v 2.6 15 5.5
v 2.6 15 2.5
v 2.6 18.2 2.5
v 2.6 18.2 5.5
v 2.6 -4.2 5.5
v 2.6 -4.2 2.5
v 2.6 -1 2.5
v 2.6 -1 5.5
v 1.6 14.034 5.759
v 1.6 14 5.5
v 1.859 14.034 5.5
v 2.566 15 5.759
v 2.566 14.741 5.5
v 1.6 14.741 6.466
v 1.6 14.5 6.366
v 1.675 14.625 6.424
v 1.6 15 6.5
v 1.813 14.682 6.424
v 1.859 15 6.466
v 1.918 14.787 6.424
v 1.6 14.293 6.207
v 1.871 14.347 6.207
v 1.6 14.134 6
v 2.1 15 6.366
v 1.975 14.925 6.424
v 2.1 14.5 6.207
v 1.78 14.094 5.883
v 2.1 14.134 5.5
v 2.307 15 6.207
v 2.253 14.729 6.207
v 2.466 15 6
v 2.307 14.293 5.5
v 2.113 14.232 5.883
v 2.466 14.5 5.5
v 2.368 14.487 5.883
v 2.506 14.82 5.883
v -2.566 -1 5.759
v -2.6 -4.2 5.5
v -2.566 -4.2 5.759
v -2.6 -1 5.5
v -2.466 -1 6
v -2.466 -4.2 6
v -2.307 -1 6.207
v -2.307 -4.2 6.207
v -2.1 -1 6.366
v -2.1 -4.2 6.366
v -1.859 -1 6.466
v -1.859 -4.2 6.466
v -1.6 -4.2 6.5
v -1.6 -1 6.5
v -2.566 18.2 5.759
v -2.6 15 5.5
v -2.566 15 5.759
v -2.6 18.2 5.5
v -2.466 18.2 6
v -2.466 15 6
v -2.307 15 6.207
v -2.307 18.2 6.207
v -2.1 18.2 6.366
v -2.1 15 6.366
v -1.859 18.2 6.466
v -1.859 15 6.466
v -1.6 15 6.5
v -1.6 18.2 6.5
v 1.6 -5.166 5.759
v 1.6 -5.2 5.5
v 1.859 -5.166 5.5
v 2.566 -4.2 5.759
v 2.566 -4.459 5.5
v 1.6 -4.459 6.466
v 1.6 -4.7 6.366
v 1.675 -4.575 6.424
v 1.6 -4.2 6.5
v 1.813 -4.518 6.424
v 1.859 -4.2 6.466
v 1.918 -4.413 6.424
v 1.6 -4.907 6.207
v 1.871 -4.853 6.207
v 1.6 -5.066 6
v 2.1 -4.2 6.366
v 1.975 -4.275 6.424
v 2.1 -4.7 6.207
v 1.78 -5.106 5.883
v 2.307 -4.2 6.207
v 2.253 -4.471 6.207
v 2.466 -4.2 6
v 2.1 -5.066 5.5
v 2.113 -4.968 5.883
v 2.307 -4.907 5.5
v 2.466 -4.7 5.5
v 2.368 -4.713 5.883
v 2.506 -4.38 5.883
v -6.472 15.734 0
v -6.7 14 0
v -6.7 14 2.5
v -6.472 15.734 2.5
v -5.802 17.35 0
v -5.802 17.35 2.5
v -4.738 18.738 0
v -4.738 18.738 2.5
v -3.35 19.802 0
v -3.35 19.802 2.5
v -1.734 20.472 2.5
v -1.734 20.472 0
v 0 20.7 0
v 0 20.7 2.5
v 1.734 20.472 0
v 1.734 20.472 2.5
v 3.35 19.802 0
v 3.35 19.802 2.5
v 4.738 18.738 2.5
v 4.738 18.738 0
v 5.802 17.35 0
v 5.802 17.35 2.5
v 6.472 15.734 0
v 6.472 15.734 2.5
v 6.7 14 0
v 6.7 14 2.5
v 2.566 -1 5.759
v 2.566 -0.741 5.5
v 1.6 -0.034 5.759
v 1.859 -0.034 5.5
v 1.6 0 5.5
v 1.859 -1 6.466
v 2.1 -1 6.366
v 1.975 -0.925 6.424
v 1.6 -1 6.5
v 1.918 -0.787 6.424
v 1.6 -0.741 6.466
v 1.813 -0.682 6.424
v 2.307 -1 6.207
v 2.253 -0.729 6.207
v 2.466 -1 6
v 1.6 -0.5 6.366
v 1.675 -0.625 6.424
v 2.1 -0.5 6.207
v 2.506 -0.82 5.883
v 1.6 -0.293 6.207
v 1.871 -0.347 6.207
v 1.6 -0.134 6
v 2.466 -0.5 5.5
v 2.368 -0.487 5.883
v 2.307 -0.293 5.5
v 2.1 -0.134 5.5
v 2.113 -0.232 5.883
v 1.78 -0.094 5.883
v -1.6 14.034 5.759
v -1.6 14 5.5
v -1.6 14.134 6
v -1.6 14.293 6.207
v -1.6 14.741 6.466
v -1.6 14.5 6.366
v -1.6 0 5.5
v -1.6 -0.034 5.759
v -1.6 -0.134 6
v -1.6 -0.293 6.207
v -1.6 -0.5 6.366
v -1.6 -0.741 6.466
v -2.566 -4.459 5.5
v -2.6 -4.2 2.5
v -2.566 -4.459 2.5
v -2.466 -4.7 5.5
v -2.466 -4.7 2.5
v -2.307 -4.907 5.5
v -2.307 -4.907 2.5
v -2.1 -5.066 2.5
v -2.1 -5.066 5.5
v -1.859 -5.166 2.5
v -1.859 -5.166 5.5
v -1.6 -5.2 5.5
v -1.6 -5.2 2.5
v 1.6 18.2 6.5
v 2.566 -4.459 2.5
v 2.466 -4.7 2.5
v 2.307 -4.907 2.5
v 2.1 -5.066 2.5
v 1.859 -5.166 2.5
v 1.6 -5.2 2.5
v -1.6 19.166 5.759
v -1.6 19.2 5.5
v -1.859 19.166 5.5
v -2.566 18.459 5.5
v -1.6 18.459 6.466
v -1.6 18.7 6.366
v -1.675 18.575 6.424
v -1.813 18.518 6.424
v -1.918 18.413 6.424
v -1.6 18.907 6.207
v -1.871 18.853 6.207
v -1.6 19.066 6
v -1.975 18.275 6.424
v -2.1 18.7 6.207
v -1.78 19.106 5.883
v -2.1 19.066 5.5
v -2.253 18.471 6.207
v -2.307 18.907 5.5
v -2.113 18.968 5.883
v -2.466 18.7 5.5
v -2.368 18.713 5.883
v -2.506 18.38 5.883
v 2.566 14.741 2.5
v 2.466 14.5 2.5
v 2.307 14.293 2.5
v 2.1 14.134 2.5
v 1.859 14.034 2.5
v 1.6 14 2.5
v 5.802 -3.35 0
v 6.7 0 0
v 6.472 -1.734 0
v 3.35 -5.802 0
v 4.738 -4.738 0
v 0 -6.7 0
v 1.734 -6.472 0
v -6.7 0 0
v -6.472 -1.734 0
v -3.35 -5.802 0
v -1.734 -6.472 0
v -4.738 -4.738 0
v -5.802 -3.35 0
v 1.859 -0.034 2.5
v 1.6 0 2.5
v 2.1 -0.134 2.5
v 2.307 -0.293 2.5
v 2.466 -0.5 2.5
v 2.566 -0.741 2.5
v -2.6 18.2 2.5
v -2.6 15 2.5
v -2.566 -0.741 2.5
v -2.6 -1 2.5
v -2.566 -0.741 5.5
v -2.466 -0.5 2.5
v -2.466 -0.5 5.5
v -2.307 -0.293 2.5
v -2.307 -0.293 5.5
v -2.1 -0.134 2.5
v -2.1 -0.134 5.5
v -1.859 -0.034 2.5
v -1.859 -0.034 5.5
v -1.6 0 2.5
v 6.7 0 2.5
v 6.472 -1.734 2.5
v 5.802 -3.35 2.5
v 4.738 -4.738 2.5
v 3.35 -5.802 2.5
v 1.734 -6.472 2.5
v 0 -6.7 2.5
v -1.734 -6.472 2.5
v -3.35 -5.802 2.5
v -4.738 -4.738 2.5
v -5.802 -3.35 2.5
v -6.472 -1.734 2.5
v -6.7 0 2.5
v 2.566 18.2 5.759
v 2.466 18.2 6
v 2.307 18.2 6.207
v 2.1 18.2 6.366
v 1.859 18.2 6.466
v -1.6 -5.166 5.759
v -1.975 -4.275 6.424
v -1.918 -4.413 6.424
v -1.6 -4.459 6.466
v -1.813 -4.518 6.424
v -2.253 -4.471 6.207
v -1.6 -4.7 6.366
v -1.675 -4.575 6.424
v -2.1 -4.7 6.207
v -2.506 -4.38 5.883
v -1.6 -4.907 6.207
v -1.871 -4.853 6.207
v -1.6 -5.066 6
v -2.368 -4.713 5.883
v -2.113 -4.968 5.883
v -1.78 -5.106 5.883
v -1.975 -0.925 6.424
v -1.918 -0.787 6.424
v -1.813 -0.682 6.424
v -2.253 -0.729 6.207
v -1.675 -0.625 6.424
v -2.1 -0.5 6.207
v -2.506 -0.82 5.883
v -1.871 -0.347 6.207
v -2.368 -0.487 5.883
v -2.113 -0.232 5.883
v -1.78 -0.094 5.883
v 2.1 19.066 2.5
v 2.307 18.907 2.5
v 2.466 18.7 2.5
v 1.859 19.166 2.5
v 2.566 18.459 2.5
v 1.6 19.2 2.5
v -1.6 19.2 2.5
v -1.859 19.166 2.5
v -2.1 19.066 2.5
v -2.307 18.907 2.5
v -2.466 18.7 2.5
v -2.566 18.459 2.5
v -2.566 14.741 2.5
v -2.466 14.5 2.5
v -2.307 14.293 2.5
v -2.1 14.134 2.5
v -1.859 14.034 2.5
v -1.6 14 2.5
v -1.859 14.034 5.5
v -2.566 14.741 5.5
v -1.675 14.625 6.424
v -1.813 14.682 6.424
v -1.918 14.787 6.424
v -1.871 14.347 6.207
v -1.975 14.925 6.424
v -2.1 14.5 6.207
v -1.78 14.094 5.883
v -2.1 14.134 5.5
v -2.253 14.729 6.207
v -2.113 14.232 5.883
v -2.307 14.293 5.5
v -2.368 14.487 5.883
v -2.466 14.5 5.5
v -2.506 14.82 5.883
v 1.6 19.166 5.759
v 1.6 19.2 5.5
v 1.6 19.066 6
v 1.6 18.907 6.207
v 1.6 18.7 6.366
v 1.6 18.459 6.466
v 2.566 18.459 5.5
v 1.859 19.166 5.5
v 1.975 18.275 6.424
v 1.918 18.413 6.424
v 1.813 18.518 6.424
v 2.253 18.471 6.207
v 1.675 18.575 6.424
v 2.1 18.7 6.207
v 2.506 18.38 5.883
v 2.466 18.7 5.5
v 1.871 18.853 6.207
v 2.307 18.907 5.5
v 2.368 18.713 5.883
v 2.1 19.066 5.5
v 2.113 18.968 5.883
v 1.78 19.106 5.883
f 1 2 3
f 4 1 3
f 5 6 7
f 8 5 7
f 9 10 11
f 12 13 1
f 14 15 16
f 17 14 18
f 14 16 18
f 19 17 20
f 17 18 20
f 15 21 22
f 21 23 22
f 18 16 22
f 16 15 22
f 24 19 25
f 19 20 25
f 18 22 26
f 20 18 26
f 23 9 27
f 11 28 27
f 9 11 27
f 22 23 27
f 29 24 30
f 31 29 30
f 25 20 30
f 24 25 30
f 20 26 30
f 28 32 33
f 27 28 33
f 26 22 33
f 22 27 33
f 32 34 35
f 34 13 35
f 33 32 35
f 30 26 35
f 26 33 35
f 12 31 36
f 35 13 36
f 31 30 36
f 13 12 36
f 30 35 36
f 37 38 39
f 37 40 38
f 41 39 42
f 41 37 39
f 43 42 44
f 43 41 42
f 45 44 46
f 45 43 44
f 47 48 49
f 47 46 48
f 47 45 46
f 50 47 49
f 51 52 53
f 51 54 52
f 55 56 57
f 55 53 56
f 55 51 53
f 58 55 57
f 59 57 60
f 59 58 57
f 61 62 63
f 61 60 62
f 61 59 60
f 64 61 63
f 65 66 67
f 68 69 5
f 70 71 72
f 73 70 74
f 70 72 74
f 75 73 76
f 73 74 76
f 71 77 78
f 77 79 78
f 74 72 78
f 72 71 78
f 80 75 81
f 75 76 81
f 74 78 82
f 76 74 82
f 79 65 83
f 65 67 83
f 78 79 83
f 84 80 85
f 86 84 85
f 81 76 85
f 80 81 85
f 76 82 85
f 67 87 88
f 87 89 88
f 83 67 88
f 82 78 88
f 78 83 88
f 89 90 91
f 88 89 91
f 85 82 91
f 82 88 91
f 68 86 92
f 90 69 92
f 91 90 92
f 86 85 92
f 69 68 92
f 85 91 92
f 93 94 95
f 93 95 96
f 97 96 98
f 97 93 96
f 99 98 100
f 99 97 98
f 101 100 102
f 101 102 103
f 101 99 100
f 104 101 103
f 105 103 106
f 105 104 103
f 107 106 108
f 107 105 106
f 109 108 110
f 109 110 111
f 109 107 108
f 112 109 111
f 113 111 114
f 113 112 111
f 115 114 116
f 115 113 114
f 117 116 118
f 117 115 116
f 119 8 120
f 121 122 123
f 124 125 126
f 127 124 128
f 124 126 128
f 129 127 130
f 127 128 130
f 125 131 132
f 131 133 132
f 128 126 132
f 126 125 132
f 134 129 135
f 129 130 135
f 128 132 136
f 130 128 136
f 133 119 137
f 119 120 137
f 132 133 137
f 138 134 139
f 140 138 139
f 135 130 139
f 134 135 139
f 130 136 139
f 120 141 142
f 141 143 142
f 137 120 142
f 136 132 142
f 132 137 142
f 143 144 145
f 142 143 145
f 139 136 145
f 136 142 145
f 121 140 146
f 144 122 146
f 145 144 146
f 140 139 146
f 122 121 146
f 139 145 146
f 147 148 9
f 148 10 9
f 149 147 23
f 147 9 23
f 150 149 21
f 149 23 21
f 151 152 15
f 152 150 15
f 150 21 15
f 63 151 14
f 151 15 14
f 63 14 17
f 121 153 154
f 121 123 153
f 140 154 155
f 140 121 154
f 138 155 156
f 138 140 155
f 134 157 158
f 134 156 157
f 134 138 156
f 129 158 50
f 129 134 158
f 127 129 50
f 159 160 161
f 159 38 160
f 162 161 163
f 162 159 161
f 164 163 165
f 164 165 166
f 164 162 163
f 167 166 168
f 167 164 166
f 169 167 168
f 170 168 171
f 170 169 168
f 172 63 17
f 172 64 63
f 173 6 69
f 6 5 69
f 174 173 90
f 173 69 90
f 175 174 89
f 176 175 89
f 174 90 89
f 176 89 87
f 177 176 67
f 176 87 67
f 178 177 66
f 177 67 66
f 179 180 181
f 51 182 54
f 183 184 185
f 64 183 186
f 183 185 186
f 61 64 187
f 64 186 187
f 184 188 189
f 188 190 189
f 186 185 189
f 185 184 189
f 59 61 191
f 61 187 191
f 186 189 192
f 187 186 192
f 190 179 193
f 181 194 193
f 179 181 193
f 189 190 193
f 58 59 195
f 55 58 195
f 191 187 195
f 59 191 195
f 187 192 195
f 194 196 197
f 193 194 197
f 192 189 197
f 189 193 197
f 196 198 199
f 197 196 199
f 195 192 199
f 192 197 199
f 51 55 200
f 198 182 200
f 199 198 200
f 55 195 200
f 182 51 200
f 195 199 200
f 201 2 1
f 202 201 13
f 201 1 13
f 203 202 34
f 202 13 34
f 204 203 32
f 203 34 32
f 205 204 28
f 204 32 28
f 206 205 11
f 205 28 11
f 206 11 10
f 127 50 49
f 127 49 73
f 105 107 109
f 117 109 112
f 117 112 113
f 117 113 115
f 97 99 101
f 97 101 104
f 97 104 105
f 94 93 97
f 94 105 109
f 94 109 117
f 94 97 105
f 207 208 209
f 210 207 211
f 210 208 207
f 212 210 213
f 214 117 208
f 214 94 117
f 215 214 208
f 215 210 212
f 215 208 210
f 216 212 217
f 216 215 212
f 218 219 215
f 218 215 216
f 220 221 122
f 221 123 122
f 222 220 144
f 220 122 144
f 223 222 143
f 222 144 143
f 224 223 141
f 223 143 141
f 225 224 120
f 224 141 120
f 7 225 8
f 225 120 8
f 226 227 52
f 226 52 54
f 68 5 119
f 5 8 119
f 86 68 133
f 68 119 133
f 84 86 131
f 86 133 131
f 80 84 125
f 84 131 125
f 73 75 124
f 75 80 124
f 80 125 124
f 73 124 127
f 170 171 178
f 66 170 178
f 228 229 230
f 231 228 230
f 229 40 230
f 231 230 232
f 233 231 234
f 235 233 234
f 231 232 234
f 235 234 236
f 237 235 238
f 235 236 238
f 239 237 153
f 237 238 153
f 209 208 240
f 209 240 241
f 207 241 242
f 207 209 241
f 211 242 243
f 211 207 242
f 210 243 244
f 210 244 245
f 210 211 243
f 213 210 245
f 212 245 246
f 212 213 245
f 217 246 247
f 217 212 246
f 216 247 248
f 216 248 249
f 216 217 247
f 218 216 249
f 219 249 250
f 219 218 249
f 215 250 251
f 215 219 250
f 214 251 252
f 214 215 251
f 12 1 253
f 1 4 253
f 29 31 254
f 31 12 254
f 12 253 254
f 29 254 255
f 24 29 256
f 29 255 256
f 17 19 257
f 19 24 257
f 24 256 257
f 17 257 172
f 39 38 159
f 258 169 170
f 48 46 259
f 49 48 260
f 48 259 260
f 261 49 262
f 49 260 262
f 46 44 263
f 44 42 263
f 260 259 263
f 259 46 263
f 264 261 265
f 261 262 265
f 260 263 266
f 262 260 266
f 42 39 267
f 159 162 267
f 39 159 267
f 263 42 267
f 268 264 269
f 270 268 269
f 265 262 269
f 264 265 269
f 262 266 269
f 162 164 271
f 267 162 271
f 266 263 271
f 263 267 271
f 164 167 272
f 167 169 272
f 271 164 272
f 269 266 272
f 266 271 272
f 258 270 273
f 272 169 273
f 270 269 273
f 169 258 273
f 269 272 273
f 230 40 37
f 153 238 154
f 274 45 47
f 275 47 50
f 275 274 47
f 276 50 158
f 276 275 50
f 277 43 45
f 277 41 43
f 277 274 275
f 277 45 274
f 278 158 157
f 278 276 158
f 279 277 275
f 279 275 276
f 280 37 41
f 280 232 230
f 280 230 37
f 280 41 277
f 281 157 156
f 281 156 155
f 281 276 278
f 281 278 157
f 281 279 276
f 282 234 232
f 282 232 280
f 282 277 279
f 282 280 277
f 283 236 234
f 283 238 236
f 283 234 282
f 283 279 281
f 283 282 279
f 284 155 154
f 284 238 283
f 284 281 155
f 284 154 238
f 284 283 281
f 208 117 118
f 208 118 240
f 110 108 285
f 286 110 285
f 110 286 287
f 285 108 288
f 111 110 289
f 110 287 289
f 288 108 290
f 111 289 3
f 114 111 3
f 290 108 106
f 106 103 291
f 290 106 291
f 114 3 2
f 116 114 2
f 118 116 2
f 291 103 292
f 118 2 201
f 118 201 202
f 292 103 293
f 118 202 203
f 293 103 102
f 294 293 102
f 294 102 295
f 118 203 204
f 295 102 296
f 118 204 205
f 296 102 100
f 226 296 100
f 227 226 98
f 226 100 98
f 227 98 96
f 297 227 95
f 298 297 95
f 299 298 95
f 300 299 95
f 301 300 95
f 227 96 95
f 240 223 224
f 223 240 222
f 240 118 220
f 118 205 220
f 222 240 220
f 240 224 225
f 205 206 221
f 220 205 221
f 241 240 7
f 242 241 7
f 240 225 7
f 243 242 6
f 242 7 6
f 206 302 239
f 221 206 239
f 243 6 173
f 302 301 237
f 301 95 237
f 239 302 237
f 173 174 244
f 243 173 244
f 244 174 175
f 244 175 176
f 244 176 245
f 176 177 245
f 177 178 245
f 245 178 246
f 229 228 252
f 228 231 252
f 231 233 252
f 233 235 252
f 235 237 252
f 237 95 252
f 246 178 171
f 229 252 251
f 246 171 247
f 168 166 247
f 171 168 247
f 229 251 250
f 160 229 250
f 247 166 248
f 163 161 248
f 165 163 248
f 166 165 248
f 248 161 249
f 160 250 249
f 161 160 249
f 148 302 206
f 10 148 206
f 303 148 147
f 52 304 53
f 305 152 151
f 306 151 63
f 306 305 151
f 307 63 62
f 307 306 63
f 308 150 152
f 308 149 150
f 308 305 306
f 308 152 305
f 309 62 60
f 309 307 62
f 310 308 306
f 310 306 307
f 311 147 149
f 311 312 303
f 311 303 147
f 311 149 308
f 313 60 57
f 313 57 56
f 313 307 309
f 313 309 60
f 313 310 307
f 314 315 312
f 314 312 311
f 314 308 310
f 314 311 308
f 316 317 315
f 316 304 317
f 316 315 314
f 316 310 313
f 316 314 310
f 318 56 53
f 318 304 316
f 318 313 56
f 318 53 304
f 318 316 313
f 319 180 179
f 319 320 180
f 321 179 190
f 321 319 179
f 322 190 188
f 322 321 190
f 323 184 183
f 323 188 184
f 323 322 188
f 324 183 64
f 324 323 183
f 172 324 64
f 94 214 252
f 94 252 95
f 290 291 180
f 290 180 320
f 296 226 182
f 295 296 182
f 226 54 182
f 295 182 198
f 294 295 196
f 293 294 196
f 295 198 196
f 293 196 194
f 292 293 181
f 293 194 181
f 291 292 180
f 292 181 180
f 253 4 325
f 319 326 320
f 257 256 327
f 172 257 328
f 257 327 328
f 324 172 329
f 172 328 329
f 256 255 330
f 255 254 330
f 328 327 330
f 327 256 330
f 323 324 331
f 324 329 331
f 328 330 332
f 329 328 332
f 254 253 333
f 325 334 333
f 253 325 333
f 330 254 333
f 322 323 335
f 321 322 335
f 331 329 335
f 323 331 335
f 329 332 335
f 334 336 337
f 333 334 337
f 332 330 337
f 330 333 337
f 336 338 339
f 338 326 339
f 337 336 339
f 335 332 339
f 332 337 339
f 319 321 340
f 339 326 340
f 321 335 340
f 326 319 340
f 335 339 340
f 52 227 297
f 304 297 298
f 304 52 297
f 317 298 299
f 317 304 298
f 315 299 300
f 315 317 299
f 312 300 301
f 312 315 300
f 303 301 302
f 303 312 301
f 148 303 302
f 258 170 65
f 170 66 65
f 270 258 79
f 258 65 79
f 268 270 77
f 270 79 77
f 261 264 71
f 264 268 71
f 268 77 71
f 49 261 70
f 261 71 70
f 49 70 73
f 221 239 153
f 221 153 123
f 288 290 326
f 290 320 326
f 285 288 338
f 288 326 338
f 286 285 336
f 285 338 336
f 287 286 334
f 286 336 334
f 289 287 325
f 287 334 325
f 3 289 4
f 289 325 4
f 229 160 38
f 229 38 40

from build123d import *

# Parameters (mm, degrees)
BOSS_EXTRUDE1_DEPTH = 2.5
SKETCH2_W           = 5.2
SKETCH2_H           = 5.2
BOSS_EXTRUDE2_DEPTH = 4
FILLET1_R           = 1


with BuildPart() as part:
    # Sketch1 → Boss-Extrude1 (new body)
    with BuildSketch(Plane(origin=(0, 0, 0), x_dir=(0, 1, 0), z_dir=(0, 0, 1))):
        with BuildLine():
            Line((0, 6.7), (14, 6.7))
            ThreePointArc((14, 6.7), (20.7, 0), (14, -6.7))
            Line((14, -6.7), (0, -6.7))
            ThreePointArc((0, -6.7), (-6.7, 0), (0, 6.7))
        make_face()
    extrude(amount=BOSS_EXTRUDE1_DEPTH)

    # Sketch2 → Boss-Extrude2 (add)
    with BuildSketch(Plane.XY.offset(2.5)):
        with Locations((0, -2.6)):
            Rectangle(SKETCH2_W, SKETCH2_H)
        with Locations((0, 16.6)):
            Rectangle(SKETCH2_W, SKETCH2_H)
    extrude(amount=BOSS_EXTRUDE2_DEPTH)

    # Fillet1
    fillet1_edges = [part.edges().sort_by_distance(p)[0] for p in [
        (-2.6, 0, 4.5),
        (-2.6, -5.2, 4.5),
        (2.6, -5.2, 4.5),
        (2.6, 0, 4.5),
        (-2.6, -2.6, 6.5),
        (0, -5.2, 6.5),
        (2.6, -2.6, 6.5),
        (0, 0, 6.5),
        (-2.6, 14, 4.5),
        (2.6, 14, 4.5),
        (2.6, 19.2, 4.5),
        (-2.6, 19.2, 4.5),
        (0, 14, 6.5),
        (2.6, 16.6, 6.5),
        (0, 19.2, 6.5),
        (-2.6, 16.6, 6.5),
    ]]
    fillet(fillet1_edges, radius=FILLET1_R)


solid = part.part
